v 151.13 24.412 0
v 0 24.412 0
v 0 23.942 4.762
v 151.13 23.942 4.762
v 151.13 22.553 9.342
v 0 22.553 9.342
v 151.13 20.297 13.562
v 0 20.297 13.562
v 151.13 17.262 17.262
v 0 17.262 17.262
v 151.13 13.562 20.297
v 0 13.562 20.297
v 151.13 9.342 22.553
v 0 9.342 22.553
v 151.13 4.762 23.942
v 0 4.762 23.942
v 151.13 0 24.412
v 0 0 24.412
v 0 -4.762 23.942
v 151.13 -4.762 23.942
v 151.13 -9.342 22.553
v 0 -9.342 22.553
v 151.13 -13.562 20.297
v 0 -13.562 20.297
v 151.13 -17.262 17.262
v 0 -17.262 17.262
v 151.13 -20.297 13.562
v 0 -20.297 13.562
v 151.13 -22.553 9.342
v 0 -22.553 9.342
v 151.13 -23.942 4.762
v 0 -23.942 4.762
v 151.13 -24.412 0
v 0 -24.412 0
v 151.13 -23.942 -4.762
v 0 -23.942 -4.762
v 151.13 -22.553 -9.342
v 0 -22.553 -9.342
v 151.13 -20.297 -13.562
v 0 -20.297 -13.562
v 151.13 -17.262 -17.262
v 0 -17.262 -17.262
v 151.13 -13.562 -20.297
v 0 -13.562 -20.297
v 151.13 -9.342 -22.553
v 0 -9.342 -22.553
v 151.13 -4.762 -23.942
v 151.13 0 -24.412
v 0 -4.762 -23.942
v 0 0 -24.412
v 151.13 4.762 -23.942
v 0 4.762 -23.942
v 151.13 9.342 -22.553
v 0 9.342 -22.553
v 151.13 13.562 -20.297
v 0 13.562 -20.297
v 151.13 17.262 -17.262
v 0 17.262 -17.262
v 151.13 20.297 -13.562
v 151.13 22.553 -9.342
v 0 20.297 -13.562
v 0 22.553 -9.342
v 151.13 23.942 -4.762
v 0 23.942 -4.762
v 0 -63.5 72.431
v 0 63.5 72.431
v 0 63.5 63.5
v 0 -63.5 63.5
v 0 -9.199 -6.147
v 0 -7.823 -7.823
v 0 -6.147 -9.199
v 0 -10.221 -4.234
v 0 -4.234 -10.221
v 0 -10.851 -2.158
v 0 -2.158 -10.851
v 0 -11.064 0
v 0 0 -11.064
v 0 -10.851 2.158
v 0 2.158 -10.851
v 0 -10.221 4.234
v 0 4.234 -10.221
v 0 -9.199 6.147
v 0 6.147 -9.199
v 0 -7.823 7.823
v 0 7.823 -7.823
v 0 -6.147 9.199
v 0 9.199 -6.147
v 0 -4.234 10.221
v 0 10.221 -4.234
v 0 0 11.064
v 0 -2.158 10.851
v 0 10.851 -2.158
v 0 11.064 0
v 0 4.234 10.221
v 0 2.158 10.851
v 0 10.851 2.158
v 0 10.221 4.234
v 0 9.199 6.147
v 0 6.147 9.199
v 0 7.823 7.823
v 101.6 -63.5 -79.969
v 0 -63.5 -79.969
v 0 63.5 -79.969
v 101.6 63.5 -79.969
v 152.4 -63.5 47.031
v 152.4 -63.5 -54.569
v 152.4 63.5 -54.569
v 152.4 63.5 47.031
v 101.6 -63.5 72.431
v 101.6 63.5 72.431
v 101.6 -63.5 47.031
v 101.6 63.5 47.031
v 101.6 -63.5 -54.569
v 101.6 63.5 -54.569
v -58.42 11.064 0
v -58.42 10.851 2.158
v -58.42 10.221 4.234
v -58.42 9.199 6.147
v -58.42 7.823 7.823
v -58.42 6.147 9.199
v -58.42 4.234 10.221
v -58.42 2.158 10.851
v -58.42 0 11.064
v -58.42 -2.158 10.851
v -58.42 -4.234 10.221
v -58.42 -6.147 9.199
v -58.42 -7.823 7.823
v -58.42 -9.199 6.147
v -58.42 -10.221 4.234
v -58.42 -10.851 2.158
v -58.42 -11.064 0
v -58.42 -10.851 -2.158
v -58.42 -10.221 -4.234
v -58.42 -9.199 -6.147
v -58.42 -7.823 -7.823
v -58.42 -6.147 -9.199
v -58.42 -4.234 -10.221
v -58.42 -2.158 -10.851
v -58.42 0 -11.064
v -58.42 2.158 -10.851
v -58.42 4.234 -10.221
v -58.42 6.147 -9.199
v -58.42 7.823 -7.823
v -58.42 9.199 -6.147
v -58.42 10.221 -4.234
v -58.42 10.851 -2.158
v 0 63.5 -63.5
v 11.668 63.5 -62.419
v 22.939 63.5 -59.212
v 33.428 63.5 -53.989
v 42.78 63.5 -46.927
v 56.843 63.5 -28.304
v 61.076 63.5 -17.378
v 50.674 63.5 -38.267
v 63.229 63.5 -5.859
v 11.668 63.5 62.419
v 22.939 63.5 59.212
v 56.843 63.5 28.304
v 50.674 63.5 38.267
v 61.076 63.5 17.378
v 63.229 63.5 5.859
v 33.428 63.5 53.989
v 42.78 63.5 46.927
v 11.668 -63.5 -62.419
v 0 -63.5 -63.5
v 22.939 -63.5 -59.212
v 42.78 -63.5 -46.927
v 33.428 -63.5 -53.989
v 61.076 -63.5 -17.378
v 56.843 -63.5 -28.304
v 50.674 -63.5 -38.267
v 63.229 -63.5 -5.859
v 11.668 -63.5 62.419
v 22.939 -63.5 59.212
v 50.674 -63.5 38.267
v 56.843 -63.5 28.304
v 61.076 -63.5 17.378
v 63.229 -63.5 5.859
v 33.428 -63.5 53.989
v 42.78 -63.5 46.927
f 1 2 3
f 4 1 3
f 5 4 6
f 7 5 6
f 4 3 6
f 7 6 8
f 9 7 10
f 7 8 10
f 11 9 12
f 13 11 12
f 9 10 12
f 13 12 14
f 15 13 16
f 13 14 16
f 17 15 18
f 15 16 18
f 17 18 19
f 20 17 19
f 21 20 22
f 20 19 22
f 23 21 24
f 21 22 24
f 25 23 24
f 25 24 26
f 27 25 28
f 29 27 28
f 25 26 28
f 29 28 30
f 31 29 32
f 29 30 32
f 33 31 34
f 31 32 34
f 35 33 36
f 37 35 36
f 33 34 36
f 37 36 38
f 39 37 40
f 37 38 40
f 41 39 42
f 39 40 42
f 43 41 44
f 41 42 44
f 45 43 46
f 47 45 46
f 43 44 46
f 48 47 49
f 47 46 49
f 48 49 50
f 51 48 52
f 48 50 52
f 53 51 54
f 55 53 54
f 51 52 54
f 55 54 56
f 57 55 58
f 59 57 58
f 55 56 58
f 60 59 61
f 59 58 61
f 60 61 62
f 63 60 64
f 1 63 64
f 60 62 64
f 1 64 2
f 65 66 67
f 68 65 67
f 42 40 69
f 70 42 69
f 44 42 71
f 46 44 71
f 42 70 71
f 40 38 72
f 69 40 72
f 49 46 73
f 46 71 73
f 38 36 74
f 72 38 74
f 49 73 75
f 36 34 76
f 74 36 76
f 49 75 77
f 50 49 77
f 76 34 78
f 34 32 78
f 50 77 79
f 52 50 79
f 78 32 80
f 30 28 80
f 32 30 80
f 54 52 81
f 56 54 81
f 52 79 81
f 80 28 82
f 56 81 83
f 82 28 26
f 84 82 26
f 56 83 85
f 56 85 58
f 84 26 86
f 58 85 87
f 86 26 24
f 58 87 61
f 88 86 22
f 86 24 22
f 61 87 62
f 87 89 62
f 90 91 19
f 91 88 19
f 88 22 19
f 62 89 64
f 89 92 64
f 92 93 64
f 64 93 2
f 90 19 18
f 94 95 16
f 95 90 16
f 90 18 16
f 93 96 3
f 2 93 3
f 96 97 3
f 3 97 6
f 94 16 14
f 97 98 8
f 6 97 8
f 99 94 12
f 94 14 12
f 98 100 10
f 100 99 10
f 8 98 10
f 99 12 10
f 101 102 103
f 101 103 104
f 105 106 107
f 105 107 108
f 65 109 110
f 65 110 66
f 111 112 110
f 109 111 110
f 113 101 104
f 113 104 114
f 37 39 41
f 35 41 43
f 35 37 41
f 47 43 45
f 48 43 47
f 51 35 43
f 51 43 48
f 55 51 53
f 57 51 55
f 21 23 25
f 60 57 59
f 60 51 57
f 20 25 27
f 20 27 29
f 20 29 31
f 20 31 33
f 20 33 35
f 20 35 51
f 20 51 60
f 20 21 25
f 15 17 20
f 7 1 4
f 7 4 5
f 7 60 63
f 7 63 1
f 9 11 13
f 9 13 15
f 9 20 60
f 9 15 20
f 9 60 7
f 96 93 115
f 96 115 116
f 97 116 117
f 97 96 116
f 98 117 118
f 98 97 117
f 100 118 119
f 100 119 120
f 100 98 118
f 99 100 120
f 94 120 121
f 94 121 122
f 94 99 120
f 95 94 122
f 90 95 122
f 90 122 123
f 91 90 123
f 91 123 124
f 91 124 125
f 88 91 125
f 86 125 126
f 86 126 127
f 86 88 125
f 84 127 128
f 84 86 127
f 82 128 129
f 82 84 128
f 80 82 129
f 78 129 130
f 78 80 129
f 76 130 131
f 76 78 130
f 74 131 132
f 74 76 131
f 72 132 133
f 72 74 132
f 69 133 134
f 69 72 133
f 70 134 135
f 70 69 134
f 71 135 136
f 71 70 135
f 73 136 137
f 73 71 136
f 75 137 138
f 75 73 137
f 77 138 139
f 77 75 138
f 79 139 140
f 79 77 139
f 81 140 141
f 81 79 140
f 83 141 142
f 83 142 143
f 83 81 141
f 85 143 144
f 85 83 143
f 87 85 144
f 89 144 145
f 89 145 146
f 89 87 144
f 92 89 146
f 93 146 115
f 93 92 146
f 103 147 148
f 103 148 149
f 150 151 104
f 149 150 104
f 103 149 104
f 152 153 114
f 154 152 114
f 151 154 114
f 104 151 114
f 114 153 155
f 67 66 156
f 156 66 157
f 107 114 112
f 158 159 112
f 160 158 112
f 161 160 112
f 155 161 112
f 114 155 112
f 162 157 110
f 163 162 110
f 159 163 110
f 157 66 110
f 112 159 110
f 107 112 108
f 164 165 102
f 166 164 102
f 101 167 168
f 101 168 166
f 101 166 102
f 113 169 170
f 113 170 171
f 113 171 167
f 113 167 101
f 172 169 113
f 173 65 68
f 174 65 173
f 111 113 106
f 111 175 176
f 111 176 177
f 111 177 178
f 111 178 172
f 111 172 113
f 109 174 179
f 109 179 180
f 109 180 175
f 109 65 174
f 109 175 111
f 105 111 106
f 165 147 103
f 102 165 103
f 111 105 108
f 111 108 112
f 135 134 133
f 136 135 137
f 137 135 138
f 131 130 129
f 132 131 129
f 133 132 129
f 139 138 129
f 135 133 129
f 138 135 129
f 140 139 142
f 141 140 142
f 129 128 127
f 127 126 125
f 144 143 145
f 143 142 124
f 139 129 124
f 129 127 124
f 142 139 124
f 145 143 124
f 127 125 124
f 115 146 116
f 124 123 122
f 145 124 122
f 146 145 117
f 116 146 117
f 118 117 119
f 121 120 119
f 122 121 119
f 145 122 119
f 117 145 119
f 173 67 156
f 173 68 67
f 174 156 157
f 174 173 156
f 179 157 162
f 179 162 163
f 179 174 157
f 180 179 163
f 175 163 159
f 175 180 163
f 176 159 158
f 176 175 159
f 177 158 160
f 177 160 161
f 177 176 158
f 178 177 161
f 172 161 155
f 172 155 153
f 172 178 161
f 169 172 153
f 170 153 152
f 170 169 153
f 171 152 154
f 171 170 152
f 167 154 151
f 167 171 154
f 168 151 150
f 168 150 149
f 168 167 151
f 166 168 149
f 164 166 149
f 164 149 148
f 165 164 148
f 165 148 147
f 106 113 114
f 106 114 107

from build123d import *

# Parameters (mm, degrees)
F1_DEPTH = 63.5
F2_R     = 24.4115083372
F3_DEPTH = 151.13
F4_R     = 11.0635092774
F5_DEPTH = 58.42


with BuildPart() as f1:
    # F0 (on Front) → F1 (new body, symmetric)
    with BuildSketch(Plane.XZ):
        with BuildLine():
            Line((0, -63.5), (0, -79.9685076945))
            Line((0, -79.9685076945), (101.6, -79.9685076945))
            Line((101.6, -79.9685076945), (101.6, -54.5685076945))
            Line((101.6, -54.5685076945), (152.4, -54.5685076945))
            Line((152.4, -54.5685076945), (152.4, 47.0314923055))
            Line((152.4, 47.0314923055), (101.6, 47.0314923055))
            Line((101.6, 47.0314923055), (101.6, 72.4314923055))
            Line((101.6, 72.4314923055), (0, 72.4314923055))
            Line((0, 72.4314923055), (0, 63.5))
            ThreePointArc((0, 63.5), (63.5, 0), (0, -63.5))
        make_face()
    extrude(amount=F1_DEPTH, both=True)


with BuildPart() as f3:
    # F2 (on Right) → F3 (new body)
    with BuildSketch(Plane.YZ):
        Circle(F2_R)
    extrude(amount=F3_DEPTH)

    # F4 (on Right) → F5 (join)
    with BuildSketch(Plane.YZ):
        Circle(F4_R)
    extrude(amount=-F5_DEPTH)


solid = Compound([f1.part, f3.part])
